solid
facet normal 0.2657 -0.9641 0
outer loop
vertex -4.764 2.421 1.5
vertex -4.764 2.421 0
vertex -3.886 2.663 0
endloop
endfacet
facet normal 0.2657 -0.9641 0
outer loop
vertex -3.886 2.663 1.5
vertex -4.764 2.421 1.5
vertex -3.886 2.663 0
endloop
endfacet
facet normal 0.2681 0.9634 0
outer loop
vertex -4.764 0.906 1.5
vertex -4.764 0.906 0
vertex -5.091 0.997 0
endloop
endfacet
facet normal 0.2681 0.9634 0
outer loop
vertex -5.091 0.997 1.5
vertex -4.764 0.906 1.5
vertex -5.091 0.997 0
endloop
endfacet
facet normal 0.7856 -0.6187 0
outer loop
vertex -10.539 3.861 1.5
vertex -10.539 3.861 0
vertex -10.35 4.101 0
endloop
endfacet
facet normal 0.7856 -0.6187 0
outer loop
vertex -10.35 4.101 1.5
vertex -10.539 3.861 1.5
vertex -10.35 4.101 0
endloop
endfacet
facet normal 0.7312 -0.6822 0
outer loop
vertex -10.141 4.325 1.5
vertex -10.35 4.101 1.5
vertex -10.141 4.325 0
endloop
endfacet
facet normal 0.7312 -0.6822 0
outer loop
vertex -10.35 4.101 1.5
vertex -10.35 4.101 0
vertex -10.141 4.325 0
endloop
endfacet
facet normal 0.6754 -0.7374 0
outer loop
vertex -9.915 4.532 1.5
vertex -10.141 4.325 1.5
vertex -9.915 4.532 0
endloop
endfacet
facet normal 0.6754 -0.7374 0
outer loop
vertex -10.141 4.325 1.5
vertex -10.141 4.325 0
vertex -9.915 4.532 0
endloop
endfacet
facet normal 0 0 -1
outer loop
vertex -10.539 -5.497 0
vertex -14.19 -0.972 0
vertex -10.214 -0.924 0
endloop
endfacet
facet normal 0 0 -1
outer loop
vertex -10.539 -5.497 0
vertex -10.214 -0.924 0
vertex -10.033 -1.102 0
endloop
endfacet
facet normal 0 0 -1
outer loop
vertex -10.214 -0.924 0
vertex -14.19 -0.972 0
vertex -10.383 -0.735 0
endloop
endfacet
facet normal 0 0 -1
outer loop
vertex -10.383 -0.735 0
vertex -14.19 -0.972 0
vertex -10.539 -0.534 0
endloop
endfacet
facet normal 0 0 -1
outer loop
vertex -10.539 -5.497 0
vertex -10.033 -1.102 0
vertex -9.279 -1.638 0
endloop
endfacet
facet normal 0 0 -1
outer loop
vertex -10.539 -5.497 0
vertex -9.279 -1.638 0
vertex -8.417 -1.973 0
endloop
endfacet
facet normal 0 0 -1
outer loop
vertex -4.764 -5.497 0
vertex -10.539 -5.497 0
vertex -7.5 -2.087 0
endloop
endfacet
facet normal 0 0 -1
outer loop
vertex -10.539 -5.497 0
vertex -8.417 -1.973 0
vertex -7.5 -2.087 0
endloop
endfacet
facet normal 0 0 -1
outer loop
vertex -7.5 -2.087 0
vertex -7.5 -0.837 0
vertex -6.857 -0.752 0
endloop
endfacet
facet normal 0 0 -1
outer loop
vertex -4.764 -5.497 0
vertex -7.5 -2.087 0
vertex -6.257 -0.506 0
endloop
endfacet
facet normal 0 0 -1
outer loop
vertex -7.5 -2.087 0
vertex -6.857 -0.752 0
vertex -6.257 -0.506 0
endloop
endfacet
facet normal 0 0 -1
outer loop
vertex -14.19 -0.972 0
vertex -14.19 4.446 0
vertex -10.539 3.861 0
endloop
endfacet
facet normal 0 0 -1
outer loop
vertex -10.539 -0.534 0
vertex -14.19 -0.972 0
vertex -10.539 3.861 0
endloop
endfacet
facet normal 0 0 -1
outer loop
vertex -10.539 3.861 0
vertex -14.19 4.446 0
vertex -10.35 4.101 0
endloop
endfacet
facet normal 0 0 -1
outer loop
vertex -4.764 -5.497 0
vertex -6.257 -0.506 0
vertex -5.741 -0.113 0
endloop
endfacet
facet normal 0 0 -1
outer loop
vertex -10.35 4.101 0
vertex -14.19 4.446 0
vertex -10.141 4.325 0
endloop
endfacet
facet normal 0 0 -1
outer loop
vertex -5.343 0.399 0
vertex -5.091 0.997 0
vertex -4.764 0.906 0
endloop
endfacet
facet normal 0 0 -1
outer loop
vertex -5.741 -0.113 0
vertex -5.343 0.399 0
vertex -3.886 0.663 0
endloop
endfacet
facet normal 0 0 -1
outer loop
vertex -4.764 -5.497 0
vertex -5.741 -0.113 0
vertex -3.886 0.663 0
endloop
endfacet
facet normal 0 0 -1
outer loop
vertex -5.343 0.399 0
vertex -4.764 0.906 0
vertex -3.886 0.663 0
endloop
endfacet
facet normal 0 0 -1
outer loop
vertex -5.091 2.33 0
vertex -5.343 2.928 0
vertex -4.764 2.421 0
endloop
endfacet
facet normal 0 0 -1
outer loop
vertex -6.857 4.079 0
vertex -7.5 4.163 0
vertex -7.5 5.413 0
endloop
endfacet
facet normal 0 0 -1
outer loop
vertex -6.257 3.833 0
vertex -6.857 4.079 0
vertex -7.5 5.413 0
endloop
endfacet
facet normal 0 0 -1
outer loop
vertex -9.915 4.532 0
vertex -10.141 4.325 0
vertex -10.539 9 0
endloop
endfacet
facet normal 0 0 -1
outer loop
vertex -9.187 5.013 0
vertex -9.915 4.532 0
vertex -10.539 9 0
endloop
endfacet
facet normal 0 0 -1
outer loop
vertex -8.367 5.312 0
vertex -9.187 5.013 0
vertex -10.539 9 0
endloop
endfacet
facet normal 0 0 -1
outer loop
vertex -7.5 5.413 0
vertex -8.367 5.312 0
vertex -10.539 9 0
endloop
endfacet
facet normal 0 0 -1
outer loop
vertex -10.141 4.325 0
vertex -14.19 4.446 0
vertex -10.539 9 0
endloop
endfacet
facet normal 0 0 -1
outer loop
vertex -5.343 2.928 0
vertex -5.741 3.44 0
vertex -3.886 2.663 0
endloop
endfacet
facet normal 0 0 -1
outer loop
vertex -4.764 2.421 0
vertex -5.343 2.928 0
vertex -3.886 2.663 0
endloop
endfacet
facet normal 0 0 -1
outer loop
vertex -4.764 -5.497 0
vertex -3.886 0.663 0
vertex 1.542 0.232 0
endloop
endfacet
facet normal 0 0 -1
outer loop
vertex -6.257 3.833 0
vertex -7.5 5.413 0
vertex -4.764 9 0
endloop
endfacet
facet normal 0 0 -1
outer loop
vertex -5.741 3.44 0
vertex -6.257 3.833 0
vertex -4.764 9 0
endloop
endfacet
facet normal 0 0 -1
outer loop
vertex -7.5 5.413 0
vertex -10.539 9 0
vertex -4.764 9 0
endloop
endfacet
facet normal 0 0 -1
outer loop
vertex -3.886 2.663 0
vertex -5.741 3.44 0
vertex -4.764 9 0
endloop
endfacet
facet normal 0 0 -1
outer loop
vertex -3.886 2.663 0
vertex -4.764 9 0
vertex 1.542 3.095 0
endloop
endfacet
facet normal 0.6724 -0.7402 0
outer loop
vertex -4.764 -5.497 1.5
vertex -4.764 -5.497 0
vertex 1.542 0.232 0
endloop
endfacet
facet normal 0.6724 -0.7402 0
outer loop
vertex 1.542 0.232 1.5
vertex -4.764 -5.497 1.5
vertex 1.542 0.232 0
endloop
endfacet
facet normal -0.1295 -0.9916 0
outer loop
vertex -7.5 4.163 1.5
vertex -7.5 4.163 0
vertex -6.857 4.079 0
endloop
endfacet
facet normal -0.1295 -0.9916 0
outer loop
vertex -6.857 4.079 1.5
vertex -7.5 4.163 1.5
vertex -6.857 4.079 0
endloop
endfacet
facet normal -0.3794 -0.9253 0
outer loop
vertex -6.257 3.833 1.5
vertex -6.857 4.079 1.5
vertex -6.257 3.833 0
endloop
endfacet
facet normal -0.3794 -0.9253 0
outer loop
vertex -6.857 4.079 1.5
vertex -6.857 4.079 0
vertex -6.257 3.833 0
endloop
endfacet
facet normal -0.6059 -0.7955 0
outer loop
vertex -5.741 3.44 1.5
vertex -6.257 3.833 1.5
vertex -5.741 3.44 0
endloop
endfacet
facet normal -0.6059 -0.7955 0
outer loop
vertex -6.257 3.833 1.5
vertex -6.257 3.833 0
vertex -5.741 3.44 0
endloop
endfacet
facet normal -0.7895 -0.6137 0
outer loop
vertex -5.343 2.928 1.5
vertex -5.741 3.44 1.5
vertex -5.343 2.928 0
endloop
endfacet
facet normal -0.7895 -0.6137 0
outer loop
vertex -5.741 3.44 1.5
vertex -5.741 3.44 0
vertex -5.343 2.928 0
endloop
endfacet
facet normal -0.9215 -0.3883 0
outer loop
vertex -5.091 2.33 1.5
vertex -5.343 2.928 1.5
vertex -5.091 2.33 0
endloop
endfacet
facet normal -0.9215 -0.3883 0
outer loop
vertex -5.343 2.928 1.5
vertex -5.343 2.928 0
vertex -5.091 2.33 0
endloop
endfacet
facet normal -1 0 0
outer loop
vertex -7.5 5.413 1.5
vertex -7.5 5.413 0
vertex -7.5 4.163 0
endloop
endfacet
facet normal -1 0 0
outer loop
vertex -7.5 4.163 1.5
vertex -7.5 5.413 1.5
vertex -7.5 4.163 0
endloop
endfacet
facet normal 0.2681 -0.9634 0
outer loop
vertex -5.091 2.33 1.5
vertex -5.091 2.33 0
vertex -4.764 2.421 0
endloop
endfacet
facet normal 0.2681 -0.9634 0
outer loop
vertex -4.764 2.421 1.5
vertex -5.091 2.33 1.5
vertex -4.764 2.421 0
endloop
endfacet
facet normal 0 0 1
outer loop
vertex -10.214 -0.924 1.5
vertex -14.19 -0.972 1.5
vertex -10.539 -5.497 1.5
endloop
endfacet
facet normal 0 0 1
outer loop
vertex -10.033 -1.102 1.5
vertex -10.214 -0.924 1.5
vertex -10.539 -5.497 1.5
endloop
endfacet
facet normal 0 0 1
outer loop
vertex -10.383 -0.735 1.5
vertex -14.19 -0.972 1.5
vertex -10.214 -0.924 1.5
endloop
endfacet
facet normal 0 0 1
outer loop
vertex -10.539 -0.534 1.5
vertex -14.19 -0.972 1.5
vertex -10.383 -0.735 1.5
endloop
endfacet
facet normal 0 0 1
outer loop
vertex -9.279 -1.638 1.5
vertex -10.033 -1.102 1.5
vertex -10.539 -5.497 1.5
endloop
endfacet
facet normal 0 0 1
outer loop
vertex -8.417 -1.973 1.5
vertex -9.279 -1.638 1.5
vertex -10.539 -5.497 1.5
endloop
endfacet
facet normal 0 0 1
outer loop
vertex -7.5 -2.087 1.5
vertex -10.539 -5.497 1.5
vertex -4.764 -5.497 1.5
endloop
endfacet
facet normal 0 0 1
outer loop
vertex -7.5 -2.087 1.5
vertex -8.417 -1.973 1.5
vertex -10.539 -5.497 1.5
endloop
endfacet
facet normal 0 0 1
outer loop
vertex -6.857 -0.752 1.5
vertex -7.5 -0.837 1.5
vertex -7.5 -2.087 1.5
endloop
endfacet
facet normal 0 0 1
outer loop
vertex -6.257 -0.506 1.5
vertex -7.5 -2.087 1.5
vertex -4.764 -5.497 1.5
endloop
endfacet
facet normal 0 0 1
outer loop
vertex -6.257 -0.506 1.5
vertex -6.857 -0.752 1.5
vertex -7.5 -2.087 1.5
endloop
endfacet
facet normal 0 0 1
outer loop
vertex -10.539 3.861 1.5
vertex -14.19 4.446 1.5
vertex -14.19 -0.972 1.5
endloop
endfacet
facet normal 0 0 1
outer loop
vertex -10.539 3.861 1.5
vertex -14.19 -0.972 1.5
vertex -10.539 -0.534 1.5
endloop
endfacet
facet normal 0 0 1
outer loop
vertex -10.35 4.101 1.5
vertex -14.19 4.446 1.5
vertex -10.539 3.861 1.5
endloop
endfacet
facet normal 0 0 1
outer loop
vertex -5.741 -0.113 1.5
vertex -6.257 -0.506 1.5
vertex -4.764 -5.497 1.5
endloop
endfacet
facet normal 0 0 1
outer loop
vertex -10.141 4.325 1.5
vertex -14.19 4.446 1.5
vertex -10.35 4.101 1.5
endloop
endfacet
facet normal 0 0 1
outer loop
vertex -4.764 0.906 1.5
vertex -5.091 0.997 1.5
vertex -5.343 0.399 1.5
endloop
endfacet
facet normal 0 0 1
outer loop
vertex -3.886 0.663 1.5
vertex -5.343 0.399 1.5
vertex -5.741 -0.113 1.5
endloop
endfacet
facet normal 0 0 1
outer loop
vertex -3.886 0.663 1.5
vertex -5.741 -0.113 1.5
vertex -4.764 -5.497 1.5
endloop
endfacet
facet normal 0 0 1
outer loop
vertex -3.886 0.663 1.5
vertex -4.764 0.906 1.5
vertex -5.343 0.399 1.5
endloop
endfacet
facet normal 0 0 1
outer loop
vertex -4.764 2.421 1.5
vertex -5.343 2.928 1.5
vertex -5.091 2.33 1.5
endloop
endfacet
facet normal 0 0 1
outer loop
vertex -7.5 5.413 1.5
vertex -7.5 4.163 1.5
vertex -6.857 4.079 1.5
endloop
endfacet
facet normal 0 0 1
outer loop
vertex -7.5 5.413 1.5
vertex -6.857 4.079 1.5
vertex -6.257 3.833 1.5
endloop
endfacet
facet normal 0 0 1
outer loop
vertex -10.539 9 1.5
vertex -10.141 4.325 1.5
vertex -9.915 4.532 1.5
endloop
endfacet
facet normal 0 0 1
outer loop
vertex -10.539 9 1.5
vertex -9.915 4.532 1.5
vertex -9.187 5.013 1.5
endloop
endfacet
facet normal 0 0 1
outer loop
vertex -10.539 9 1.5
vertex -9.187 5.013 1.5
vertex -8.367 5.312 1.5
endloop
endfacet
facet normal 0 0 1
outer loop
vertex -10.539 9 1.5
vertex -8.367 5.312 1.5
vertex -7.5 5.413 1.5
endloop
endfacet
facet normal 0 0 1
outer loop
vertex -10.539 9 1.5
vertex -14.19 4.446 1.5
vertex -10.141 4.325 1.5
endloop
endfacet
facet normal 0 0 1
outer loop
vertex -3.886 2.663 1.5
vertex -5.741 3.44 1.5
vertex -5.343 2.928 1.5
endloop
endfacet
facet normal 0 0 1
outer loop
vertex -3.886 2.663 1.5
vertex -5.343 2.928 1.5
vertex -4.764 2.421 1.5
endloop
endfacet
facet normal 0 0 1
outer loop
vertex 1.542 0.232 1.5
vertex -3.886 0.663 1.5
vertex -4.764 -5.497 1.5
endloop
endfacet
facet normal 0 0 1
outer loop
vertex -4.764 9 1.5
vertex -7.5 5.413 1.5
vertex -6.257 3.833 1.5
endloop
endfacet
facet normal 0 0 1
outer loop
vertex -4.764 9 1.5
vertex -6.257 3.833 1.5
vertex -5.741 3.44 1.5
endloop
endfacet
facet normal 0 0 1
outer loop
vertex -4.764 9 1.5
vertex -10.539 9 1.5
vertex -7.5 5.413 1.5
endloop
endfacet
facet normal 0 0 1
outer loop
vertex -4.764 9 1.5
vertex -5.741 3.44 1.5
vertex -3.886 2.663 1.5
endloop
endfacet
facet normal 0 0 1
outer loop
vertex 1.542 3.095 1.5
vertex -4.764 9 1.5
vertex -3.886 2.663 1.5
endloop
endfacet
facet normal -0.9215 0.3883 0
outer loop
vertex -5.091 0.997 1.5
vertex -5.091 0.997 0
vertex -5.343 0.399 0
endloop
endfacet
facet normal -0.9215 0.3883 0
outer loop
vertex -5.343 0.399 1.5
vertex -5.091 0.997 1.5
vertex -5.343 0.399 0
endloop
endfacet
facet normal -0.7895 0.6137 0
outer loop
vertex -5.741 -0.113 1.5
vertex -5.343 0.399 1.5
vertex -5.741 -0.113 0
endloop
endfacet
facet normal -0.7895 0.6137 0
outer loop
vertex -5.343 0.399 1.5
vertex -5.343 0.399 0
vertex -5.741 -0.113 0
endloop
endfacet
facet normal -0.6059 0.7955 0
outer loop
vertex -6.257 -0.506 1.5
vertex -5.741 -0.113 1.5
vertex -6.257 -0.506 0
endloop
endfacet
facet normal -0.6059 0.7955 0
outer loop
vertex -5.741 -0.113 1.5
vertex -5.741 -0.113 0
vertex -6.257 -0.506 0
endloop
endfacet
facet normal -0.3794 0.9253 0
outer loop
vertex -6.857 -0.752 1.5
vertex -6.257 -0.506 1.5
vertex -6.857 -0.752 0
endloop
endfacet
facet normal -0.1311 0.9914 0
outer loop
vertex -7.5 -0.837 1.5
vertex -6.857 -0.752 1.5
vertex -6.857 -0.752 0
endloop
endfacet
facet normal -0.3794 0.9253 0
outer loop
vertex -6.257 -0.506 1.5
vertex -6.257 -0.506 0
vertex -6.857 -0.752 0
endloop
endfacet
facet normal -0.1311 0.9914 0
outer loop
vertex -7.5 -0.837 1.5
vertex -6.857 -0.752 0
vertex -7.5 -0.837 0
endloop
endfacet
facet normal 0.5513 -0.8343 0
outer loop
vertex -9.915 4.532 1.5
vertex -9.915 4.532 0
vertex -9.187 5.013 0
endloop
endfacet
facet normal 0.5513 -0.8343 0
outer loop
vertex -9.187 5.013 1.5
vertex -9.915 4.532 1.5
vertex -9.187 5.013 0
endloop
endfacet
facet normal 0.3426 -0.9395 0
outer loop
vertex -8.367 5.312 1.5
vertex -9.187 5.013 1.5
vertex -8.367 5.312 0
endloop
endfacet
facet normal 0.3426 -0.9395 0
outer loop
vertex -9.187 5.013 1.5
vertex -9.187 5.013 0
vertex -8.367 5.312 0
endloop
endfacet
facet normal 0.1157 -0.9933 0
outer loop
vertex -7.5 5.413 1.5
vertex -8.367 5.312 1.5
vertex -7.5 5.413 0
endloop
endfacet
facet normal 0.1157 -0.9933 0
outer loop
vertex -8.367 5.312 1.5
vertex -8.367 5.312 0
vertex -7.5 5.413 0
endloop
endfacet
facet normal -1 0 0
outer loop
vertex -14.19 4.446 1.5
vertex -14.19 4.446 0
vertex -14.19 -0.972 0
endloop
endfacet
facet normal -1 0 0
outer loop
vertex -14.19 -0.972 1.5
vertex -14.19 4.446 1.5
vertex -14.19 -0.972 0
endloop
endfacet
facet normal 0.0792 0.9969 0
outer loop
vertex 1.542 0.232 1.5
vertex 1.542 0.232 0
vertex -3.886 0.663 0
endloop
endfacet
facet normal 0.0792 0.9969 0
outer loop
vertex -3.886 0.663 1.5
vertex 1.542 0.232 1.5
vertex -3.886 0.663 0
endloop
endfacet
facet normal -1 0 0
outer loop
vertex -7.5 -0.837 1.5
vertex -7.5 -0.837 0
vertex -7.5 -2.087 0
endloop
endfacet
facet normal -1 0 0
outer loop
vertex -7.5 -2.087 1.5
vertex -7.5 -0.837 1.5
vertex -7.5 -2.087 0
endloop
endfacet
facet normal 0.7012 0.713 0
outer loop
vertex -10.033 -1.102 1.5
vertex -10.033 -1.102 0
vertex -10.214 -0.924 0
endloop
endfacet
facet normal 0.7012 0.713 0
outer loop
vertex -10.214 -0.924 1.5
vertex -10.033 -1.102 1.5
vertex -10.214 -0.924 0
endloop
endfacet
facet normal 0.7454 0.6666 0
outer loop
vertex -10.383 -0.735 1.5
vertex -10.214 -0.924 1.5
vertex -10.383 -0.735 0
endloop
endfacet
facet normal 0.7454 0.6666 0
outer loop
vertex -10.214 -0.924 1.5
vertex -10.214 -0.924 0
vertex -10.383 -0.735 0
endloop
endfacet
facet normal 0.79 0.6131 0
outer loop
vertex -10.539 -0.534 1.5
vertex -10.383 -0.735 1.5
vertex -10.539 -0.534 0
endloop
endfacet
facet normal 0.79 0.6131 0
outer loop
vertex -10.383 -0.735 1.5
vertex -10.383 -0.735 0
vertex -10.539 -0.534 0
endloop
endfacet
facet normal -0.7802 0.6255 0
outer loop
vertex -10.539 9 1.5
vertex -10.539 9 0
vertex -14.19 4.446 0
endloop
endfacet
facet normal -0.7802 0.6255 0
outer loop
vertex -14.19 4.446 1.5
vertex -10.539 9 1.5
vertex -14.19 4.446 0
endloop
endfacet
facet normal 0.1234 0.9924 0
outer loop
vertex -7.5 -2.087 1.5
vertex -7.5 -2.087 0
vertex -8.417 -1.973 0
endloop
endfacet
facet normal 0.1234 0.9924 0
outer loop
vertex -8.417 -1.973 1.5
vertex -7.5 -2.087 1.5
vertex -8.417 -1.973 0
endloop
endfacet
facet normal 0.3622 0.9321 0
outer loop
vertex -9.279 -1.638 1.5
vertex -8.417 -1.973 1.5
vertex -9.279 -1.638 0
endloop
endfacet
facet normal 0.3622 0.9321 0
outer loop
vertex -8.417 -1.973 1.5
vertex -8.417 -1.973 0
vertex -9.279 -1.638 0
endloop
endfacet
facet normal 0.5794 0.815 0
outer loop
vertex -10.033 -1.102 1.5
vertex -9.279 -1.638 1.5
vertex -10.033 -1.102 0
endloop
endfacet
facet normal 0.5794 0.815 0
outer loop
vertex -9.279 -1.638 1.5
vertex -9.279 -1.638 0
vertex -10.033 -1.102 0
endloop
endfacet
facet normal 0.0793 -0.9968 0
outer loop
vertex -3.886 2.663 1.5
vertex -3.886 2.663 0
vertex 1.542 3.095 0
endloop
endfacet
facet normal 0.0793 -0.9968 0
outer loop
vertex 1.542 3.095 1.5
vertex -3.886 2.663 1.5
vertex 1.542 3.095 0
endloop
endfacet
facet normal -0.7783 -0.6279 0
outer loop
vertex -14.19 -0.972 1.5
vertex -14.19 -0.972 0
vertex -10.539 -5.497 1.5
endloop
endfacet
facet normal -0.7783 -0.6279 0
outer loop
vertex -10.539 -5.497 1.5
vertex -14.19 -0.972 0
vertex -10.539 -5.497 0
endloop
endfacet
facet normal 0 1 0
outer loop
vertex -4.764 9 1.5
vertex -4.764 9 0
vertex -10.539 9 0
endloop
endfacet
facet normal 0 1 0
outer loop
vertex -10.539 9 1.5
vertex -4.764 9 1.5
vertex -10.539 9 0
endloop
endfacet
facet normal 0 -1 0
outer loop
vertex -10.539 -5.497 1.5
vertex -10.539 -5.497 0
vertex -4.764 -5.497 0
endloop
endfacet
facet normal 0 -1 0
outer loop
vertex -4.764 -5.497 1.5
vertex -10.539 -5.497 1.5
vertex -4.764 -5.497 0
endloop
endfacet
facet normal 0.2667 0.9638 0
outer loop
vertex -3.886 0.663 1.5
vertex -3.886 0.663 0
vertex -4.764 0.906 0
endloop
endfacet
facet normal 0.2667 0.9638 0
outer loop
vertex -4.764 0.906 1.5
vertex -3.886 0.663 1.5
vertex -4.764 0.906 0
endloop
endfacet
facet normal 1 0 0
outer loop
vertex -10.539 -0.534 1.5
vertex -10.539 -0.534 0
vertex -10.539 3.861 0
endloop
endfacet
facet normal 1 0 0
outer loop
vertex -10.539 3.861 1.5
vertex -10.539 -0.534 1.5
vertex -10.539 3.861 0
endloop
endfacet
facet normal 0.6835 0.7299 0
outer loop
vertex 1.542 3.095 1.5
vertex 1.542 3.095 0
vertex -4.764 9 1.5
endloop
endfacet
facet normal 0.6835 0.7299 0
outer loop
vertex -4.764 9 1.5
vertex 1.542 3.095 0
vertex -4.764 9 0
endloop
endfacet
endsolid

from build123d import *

# Parameters (mm, degrees)
F1_DEPTH = 1.5


# Not quite as in the source:
# - a feature names something its author has since deleted; it is built from what else it names


with BuildPart() as f1:
    # F0 (on Top) → F1 (new body)
    with BuildSketch(Plane.XY):
        with BuildLine():
            ThreePointArc((-4.7637764364, 4.2277344156), (-4.22987066, 3.4988615225), (-3.8857919263, 2.6634449214))
            Line((-3.8857919263, 2.6634449214), (1.5419516712, 3.0945423002))
            Line((1.5419516712, 3.0945423002), (-4.7637764364, 9))
            Line((-4.7637764364, 9), (-4.7637764364, 4.2277344156))
        make_face()
        with BuildLine():
            ThreePointArc((-7.5, -2.0865550786), (-6.0089576806, -1.7773824212), (-4.7637764364, -0.9008445729))
            Line((-4.7637764364, -0.9008445729), (-4.7637764364, 0.9063707553))
            Line((-4.7637764364, 0.9063707553), (-5.0905279509, 0.9967782547))
            ThreePointArc((-5.0905279509, 0.9967782547), (-5.986174823, -0.326111143), (-7.5, -0.8365550786))
            Line((-7.5, -0.8365550786), (-7.5, -2.0865550786))
        make_face()
        with BuildLine():
            Line((-4.7637764364, 2.4205190875), (-4.7637764364, 4.2277344156))
            ThreePointArc((-4.7637764364, 4.2277344156), (-6.0089576806, 5.104272264), (-7.5, 5.4134449214))
            Line((-7.5, 5.4134449214), (-7.5, 4.1634449214))
            ThreePointArc((-7.5, 4.1634449214), (-5.986174823, 3.6530009858), (-5.0905279509, 2.330111588))
            Line((-5.0905279509, 2.330111588), (-4.7637764364, 2.4205190875))
        make_face()
        with BuildLine():
            Line((-10.5388853699, 1.6634449214), (-10.5388853699, 3.8606421607))
            ThreePointArc((-10.5388853699, 3.8606421607), (-11.0677948468, 2.8181483168), (-11.25, 1.6634449214))
            Line((-11.25, 1.6634449214), (-10.5388853699, 1.6634449214))
        make_face()
        with BuildLine():
            ThreePointArc((-11.25, 1.6634449214), (-11.0677948468, 0.5087415259), (-10.5388853699, -0.533752318))
            Line((-10.5388853699, -0.533752318), (-10.5388853699, 1.6634449214))
            Line((-10.5388853699, 1.6634449214), (-11.25, 1.6634449214))
        make_face()
        with BuildLine():
            Line((1.5419516712, 0.2323475426), (-3.8857919263, 0.6634449214))
            ThreePointArc((-3.8857919263, 0.6634449214), (-4.22987066, -0.1719716798), (-4.7637764364, -0.9008445729))
            Line((-4.7637764364, -0.9008445729), (-4.7637764364, -5.4970695637))
            Line((-4.7637764364, -5.4970695637), (1.5419516712, 0.2323475426))
        make_face()
        with BuildLine():
            Line((-4.7637764364, -5.4970695637), (-4.7637764364, -0.9008445729))
            ThreePointArc((-4.7637764364, -0.9008445729), (-6.0089576806, -1.7773824212), (-7.5, -2.0865550786))
            ThreePointArc((-7.5, -2.0865550786), (-8.8586144698, -1.831789938), (-10.0326275495, -1.102110664))
            ThreePointArc((-10.0326275495, -1.102110664), (-10.300213716, -0.8308091044), (-10.5388853699, -0.533752318))
            Line((-10.5388853699, -0.533752318), (-10.5388853699, -5.4970695637))
            Line((-10.5388853699, -5.4970695637), (-4.7637764364, -5.4970695637))
        make_face()
        with BuildLine():
            ThreePointArc((-7.5, 5.4134449214), (-6.0089576806, 5.104272264), (-4.7637764364, 4.2277344156))
            Line((-4.7637764364, 4.2277344156), (-4.7637764364, 9))
            Line((-4.7637764364, 9), (-10.5388853699, 9))
            Line((-10.5388853699, 9), (-10.5388853699, 3.8606421607))
            ThreePointArc((-10.5388853699, 3.8606421607), (-10.2477408327, 4.2153893401), (-9.9154440374, 4.5319166577))
            ThreePointArc((-9.9154440374, 4.5319166577), (-8.7856381662, 5.1861760359), (-7.5, 5.4134449214))
        make_face()
        with BuildLine():
            Line((-10.5388853699, 3.8606421607), (-10.5388853699, 9))
            Line((-10.5388853699, 9), (-14.1904987395, 4.4458052143))
            Line((-14.1904987395, 4.4458052143), (-14.1904987395, -0.9716537897))
            Line((-14.1904987395, -0.9716537897), (-10.5388853699, -5.4970695637))
            Line((-10.5388853699, -5.4970695637), (-10.5388853699, -0.533752318))
            ThreePointArc((-10.5388853699, -0.533752318), (-11.0677948468, 0.5087415259), (-11.25, 1.6634449214))
            ThreePointArc((-11.25, 1.6634449214), (-11.0677948468, 2.8181483168), (-10.5388853699, 3.8606421607))
        make_face()
        with BuildLine():
            ThreePointArc((-4.7637764364, -0.9008445729), (-4.22987066, -0.1719716798), (-3.8857919263, 0.6634449214))
            Line((-3.8857919263, 0.6634449214), (-4.7637764364, 0.9063707553))
            Line((-4.7637764364, 0.9063707553), (-4.7637764364, -0.9008445729))
        make_face()
        with BuildLine():
            Line((-4.7637764364, 2.4205190875), (-3.8857919263, 2.6634449214))
            ThreePointArc((-3.8857919263, 2.6634449214), (-4.22987066, 3.4988615225), (-4.7637764364, 4.2277344156))
            Line((-4.7637764364, 4.2277344156), (-4.7637764364, 2.4205190875))
        make_face()
    extrude(amount=F1_DEPTH)


solid = f1.part
